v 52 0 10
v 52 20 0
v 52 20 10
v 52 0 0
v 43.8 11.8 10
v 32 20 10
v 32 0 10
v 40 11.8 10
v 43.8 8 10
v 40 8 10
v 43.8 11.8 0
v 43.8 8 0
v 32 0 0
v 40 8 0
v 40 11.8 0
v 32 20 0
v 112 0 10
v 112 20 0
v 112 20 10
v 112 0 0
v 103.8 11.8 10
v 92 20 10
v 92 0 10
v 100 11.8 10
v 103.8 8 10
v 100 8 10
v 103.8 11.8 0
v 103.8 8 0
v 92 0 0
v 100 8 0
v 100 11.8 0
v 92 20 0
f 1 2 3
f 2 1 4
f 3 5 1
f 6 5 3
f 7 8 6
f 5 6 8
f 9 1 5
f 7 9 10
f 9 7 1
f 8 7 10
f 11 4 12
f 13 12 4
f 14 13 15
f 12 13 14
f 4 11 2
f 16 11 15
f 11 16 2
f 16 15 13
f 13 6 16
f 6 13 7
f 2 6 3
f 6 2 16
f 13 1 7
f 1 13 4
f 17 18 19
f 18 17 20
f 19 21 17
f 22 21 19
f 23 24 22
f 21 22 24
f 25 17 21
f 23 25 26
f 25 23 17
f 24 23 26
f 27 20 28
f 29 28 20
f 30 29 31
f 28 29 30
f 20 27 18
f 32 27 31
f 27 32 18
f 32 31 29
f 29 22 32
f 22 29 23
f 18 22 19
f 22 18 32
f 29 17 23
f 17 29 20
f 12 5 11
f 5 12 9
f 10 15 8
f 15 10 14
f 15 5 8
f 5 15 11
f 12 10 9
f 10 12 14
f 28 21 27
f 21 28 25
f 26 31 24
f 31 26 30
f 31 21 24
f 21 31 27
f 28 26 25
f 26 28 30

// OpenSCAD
difference(){
union(){
translate([32,0,0])cube([20,20,10]);
translate([92,0,0])cube([20,20,10]);
}
translate([40,8,-2]) cube([3.8,3.8,14]);
translate([100,8,-2]) cube([3.8,3.8,14]);

}
difference(){
union(){
translate([39,7,0]) cube([6,6,10]);
translate([99,7,0]) cube([6,6,10]);
}
translate([40,8,-2]) cube([3.8,3.8,14]);
translate([100,8,-2]) cube([3.8,3.8,14]);
}
